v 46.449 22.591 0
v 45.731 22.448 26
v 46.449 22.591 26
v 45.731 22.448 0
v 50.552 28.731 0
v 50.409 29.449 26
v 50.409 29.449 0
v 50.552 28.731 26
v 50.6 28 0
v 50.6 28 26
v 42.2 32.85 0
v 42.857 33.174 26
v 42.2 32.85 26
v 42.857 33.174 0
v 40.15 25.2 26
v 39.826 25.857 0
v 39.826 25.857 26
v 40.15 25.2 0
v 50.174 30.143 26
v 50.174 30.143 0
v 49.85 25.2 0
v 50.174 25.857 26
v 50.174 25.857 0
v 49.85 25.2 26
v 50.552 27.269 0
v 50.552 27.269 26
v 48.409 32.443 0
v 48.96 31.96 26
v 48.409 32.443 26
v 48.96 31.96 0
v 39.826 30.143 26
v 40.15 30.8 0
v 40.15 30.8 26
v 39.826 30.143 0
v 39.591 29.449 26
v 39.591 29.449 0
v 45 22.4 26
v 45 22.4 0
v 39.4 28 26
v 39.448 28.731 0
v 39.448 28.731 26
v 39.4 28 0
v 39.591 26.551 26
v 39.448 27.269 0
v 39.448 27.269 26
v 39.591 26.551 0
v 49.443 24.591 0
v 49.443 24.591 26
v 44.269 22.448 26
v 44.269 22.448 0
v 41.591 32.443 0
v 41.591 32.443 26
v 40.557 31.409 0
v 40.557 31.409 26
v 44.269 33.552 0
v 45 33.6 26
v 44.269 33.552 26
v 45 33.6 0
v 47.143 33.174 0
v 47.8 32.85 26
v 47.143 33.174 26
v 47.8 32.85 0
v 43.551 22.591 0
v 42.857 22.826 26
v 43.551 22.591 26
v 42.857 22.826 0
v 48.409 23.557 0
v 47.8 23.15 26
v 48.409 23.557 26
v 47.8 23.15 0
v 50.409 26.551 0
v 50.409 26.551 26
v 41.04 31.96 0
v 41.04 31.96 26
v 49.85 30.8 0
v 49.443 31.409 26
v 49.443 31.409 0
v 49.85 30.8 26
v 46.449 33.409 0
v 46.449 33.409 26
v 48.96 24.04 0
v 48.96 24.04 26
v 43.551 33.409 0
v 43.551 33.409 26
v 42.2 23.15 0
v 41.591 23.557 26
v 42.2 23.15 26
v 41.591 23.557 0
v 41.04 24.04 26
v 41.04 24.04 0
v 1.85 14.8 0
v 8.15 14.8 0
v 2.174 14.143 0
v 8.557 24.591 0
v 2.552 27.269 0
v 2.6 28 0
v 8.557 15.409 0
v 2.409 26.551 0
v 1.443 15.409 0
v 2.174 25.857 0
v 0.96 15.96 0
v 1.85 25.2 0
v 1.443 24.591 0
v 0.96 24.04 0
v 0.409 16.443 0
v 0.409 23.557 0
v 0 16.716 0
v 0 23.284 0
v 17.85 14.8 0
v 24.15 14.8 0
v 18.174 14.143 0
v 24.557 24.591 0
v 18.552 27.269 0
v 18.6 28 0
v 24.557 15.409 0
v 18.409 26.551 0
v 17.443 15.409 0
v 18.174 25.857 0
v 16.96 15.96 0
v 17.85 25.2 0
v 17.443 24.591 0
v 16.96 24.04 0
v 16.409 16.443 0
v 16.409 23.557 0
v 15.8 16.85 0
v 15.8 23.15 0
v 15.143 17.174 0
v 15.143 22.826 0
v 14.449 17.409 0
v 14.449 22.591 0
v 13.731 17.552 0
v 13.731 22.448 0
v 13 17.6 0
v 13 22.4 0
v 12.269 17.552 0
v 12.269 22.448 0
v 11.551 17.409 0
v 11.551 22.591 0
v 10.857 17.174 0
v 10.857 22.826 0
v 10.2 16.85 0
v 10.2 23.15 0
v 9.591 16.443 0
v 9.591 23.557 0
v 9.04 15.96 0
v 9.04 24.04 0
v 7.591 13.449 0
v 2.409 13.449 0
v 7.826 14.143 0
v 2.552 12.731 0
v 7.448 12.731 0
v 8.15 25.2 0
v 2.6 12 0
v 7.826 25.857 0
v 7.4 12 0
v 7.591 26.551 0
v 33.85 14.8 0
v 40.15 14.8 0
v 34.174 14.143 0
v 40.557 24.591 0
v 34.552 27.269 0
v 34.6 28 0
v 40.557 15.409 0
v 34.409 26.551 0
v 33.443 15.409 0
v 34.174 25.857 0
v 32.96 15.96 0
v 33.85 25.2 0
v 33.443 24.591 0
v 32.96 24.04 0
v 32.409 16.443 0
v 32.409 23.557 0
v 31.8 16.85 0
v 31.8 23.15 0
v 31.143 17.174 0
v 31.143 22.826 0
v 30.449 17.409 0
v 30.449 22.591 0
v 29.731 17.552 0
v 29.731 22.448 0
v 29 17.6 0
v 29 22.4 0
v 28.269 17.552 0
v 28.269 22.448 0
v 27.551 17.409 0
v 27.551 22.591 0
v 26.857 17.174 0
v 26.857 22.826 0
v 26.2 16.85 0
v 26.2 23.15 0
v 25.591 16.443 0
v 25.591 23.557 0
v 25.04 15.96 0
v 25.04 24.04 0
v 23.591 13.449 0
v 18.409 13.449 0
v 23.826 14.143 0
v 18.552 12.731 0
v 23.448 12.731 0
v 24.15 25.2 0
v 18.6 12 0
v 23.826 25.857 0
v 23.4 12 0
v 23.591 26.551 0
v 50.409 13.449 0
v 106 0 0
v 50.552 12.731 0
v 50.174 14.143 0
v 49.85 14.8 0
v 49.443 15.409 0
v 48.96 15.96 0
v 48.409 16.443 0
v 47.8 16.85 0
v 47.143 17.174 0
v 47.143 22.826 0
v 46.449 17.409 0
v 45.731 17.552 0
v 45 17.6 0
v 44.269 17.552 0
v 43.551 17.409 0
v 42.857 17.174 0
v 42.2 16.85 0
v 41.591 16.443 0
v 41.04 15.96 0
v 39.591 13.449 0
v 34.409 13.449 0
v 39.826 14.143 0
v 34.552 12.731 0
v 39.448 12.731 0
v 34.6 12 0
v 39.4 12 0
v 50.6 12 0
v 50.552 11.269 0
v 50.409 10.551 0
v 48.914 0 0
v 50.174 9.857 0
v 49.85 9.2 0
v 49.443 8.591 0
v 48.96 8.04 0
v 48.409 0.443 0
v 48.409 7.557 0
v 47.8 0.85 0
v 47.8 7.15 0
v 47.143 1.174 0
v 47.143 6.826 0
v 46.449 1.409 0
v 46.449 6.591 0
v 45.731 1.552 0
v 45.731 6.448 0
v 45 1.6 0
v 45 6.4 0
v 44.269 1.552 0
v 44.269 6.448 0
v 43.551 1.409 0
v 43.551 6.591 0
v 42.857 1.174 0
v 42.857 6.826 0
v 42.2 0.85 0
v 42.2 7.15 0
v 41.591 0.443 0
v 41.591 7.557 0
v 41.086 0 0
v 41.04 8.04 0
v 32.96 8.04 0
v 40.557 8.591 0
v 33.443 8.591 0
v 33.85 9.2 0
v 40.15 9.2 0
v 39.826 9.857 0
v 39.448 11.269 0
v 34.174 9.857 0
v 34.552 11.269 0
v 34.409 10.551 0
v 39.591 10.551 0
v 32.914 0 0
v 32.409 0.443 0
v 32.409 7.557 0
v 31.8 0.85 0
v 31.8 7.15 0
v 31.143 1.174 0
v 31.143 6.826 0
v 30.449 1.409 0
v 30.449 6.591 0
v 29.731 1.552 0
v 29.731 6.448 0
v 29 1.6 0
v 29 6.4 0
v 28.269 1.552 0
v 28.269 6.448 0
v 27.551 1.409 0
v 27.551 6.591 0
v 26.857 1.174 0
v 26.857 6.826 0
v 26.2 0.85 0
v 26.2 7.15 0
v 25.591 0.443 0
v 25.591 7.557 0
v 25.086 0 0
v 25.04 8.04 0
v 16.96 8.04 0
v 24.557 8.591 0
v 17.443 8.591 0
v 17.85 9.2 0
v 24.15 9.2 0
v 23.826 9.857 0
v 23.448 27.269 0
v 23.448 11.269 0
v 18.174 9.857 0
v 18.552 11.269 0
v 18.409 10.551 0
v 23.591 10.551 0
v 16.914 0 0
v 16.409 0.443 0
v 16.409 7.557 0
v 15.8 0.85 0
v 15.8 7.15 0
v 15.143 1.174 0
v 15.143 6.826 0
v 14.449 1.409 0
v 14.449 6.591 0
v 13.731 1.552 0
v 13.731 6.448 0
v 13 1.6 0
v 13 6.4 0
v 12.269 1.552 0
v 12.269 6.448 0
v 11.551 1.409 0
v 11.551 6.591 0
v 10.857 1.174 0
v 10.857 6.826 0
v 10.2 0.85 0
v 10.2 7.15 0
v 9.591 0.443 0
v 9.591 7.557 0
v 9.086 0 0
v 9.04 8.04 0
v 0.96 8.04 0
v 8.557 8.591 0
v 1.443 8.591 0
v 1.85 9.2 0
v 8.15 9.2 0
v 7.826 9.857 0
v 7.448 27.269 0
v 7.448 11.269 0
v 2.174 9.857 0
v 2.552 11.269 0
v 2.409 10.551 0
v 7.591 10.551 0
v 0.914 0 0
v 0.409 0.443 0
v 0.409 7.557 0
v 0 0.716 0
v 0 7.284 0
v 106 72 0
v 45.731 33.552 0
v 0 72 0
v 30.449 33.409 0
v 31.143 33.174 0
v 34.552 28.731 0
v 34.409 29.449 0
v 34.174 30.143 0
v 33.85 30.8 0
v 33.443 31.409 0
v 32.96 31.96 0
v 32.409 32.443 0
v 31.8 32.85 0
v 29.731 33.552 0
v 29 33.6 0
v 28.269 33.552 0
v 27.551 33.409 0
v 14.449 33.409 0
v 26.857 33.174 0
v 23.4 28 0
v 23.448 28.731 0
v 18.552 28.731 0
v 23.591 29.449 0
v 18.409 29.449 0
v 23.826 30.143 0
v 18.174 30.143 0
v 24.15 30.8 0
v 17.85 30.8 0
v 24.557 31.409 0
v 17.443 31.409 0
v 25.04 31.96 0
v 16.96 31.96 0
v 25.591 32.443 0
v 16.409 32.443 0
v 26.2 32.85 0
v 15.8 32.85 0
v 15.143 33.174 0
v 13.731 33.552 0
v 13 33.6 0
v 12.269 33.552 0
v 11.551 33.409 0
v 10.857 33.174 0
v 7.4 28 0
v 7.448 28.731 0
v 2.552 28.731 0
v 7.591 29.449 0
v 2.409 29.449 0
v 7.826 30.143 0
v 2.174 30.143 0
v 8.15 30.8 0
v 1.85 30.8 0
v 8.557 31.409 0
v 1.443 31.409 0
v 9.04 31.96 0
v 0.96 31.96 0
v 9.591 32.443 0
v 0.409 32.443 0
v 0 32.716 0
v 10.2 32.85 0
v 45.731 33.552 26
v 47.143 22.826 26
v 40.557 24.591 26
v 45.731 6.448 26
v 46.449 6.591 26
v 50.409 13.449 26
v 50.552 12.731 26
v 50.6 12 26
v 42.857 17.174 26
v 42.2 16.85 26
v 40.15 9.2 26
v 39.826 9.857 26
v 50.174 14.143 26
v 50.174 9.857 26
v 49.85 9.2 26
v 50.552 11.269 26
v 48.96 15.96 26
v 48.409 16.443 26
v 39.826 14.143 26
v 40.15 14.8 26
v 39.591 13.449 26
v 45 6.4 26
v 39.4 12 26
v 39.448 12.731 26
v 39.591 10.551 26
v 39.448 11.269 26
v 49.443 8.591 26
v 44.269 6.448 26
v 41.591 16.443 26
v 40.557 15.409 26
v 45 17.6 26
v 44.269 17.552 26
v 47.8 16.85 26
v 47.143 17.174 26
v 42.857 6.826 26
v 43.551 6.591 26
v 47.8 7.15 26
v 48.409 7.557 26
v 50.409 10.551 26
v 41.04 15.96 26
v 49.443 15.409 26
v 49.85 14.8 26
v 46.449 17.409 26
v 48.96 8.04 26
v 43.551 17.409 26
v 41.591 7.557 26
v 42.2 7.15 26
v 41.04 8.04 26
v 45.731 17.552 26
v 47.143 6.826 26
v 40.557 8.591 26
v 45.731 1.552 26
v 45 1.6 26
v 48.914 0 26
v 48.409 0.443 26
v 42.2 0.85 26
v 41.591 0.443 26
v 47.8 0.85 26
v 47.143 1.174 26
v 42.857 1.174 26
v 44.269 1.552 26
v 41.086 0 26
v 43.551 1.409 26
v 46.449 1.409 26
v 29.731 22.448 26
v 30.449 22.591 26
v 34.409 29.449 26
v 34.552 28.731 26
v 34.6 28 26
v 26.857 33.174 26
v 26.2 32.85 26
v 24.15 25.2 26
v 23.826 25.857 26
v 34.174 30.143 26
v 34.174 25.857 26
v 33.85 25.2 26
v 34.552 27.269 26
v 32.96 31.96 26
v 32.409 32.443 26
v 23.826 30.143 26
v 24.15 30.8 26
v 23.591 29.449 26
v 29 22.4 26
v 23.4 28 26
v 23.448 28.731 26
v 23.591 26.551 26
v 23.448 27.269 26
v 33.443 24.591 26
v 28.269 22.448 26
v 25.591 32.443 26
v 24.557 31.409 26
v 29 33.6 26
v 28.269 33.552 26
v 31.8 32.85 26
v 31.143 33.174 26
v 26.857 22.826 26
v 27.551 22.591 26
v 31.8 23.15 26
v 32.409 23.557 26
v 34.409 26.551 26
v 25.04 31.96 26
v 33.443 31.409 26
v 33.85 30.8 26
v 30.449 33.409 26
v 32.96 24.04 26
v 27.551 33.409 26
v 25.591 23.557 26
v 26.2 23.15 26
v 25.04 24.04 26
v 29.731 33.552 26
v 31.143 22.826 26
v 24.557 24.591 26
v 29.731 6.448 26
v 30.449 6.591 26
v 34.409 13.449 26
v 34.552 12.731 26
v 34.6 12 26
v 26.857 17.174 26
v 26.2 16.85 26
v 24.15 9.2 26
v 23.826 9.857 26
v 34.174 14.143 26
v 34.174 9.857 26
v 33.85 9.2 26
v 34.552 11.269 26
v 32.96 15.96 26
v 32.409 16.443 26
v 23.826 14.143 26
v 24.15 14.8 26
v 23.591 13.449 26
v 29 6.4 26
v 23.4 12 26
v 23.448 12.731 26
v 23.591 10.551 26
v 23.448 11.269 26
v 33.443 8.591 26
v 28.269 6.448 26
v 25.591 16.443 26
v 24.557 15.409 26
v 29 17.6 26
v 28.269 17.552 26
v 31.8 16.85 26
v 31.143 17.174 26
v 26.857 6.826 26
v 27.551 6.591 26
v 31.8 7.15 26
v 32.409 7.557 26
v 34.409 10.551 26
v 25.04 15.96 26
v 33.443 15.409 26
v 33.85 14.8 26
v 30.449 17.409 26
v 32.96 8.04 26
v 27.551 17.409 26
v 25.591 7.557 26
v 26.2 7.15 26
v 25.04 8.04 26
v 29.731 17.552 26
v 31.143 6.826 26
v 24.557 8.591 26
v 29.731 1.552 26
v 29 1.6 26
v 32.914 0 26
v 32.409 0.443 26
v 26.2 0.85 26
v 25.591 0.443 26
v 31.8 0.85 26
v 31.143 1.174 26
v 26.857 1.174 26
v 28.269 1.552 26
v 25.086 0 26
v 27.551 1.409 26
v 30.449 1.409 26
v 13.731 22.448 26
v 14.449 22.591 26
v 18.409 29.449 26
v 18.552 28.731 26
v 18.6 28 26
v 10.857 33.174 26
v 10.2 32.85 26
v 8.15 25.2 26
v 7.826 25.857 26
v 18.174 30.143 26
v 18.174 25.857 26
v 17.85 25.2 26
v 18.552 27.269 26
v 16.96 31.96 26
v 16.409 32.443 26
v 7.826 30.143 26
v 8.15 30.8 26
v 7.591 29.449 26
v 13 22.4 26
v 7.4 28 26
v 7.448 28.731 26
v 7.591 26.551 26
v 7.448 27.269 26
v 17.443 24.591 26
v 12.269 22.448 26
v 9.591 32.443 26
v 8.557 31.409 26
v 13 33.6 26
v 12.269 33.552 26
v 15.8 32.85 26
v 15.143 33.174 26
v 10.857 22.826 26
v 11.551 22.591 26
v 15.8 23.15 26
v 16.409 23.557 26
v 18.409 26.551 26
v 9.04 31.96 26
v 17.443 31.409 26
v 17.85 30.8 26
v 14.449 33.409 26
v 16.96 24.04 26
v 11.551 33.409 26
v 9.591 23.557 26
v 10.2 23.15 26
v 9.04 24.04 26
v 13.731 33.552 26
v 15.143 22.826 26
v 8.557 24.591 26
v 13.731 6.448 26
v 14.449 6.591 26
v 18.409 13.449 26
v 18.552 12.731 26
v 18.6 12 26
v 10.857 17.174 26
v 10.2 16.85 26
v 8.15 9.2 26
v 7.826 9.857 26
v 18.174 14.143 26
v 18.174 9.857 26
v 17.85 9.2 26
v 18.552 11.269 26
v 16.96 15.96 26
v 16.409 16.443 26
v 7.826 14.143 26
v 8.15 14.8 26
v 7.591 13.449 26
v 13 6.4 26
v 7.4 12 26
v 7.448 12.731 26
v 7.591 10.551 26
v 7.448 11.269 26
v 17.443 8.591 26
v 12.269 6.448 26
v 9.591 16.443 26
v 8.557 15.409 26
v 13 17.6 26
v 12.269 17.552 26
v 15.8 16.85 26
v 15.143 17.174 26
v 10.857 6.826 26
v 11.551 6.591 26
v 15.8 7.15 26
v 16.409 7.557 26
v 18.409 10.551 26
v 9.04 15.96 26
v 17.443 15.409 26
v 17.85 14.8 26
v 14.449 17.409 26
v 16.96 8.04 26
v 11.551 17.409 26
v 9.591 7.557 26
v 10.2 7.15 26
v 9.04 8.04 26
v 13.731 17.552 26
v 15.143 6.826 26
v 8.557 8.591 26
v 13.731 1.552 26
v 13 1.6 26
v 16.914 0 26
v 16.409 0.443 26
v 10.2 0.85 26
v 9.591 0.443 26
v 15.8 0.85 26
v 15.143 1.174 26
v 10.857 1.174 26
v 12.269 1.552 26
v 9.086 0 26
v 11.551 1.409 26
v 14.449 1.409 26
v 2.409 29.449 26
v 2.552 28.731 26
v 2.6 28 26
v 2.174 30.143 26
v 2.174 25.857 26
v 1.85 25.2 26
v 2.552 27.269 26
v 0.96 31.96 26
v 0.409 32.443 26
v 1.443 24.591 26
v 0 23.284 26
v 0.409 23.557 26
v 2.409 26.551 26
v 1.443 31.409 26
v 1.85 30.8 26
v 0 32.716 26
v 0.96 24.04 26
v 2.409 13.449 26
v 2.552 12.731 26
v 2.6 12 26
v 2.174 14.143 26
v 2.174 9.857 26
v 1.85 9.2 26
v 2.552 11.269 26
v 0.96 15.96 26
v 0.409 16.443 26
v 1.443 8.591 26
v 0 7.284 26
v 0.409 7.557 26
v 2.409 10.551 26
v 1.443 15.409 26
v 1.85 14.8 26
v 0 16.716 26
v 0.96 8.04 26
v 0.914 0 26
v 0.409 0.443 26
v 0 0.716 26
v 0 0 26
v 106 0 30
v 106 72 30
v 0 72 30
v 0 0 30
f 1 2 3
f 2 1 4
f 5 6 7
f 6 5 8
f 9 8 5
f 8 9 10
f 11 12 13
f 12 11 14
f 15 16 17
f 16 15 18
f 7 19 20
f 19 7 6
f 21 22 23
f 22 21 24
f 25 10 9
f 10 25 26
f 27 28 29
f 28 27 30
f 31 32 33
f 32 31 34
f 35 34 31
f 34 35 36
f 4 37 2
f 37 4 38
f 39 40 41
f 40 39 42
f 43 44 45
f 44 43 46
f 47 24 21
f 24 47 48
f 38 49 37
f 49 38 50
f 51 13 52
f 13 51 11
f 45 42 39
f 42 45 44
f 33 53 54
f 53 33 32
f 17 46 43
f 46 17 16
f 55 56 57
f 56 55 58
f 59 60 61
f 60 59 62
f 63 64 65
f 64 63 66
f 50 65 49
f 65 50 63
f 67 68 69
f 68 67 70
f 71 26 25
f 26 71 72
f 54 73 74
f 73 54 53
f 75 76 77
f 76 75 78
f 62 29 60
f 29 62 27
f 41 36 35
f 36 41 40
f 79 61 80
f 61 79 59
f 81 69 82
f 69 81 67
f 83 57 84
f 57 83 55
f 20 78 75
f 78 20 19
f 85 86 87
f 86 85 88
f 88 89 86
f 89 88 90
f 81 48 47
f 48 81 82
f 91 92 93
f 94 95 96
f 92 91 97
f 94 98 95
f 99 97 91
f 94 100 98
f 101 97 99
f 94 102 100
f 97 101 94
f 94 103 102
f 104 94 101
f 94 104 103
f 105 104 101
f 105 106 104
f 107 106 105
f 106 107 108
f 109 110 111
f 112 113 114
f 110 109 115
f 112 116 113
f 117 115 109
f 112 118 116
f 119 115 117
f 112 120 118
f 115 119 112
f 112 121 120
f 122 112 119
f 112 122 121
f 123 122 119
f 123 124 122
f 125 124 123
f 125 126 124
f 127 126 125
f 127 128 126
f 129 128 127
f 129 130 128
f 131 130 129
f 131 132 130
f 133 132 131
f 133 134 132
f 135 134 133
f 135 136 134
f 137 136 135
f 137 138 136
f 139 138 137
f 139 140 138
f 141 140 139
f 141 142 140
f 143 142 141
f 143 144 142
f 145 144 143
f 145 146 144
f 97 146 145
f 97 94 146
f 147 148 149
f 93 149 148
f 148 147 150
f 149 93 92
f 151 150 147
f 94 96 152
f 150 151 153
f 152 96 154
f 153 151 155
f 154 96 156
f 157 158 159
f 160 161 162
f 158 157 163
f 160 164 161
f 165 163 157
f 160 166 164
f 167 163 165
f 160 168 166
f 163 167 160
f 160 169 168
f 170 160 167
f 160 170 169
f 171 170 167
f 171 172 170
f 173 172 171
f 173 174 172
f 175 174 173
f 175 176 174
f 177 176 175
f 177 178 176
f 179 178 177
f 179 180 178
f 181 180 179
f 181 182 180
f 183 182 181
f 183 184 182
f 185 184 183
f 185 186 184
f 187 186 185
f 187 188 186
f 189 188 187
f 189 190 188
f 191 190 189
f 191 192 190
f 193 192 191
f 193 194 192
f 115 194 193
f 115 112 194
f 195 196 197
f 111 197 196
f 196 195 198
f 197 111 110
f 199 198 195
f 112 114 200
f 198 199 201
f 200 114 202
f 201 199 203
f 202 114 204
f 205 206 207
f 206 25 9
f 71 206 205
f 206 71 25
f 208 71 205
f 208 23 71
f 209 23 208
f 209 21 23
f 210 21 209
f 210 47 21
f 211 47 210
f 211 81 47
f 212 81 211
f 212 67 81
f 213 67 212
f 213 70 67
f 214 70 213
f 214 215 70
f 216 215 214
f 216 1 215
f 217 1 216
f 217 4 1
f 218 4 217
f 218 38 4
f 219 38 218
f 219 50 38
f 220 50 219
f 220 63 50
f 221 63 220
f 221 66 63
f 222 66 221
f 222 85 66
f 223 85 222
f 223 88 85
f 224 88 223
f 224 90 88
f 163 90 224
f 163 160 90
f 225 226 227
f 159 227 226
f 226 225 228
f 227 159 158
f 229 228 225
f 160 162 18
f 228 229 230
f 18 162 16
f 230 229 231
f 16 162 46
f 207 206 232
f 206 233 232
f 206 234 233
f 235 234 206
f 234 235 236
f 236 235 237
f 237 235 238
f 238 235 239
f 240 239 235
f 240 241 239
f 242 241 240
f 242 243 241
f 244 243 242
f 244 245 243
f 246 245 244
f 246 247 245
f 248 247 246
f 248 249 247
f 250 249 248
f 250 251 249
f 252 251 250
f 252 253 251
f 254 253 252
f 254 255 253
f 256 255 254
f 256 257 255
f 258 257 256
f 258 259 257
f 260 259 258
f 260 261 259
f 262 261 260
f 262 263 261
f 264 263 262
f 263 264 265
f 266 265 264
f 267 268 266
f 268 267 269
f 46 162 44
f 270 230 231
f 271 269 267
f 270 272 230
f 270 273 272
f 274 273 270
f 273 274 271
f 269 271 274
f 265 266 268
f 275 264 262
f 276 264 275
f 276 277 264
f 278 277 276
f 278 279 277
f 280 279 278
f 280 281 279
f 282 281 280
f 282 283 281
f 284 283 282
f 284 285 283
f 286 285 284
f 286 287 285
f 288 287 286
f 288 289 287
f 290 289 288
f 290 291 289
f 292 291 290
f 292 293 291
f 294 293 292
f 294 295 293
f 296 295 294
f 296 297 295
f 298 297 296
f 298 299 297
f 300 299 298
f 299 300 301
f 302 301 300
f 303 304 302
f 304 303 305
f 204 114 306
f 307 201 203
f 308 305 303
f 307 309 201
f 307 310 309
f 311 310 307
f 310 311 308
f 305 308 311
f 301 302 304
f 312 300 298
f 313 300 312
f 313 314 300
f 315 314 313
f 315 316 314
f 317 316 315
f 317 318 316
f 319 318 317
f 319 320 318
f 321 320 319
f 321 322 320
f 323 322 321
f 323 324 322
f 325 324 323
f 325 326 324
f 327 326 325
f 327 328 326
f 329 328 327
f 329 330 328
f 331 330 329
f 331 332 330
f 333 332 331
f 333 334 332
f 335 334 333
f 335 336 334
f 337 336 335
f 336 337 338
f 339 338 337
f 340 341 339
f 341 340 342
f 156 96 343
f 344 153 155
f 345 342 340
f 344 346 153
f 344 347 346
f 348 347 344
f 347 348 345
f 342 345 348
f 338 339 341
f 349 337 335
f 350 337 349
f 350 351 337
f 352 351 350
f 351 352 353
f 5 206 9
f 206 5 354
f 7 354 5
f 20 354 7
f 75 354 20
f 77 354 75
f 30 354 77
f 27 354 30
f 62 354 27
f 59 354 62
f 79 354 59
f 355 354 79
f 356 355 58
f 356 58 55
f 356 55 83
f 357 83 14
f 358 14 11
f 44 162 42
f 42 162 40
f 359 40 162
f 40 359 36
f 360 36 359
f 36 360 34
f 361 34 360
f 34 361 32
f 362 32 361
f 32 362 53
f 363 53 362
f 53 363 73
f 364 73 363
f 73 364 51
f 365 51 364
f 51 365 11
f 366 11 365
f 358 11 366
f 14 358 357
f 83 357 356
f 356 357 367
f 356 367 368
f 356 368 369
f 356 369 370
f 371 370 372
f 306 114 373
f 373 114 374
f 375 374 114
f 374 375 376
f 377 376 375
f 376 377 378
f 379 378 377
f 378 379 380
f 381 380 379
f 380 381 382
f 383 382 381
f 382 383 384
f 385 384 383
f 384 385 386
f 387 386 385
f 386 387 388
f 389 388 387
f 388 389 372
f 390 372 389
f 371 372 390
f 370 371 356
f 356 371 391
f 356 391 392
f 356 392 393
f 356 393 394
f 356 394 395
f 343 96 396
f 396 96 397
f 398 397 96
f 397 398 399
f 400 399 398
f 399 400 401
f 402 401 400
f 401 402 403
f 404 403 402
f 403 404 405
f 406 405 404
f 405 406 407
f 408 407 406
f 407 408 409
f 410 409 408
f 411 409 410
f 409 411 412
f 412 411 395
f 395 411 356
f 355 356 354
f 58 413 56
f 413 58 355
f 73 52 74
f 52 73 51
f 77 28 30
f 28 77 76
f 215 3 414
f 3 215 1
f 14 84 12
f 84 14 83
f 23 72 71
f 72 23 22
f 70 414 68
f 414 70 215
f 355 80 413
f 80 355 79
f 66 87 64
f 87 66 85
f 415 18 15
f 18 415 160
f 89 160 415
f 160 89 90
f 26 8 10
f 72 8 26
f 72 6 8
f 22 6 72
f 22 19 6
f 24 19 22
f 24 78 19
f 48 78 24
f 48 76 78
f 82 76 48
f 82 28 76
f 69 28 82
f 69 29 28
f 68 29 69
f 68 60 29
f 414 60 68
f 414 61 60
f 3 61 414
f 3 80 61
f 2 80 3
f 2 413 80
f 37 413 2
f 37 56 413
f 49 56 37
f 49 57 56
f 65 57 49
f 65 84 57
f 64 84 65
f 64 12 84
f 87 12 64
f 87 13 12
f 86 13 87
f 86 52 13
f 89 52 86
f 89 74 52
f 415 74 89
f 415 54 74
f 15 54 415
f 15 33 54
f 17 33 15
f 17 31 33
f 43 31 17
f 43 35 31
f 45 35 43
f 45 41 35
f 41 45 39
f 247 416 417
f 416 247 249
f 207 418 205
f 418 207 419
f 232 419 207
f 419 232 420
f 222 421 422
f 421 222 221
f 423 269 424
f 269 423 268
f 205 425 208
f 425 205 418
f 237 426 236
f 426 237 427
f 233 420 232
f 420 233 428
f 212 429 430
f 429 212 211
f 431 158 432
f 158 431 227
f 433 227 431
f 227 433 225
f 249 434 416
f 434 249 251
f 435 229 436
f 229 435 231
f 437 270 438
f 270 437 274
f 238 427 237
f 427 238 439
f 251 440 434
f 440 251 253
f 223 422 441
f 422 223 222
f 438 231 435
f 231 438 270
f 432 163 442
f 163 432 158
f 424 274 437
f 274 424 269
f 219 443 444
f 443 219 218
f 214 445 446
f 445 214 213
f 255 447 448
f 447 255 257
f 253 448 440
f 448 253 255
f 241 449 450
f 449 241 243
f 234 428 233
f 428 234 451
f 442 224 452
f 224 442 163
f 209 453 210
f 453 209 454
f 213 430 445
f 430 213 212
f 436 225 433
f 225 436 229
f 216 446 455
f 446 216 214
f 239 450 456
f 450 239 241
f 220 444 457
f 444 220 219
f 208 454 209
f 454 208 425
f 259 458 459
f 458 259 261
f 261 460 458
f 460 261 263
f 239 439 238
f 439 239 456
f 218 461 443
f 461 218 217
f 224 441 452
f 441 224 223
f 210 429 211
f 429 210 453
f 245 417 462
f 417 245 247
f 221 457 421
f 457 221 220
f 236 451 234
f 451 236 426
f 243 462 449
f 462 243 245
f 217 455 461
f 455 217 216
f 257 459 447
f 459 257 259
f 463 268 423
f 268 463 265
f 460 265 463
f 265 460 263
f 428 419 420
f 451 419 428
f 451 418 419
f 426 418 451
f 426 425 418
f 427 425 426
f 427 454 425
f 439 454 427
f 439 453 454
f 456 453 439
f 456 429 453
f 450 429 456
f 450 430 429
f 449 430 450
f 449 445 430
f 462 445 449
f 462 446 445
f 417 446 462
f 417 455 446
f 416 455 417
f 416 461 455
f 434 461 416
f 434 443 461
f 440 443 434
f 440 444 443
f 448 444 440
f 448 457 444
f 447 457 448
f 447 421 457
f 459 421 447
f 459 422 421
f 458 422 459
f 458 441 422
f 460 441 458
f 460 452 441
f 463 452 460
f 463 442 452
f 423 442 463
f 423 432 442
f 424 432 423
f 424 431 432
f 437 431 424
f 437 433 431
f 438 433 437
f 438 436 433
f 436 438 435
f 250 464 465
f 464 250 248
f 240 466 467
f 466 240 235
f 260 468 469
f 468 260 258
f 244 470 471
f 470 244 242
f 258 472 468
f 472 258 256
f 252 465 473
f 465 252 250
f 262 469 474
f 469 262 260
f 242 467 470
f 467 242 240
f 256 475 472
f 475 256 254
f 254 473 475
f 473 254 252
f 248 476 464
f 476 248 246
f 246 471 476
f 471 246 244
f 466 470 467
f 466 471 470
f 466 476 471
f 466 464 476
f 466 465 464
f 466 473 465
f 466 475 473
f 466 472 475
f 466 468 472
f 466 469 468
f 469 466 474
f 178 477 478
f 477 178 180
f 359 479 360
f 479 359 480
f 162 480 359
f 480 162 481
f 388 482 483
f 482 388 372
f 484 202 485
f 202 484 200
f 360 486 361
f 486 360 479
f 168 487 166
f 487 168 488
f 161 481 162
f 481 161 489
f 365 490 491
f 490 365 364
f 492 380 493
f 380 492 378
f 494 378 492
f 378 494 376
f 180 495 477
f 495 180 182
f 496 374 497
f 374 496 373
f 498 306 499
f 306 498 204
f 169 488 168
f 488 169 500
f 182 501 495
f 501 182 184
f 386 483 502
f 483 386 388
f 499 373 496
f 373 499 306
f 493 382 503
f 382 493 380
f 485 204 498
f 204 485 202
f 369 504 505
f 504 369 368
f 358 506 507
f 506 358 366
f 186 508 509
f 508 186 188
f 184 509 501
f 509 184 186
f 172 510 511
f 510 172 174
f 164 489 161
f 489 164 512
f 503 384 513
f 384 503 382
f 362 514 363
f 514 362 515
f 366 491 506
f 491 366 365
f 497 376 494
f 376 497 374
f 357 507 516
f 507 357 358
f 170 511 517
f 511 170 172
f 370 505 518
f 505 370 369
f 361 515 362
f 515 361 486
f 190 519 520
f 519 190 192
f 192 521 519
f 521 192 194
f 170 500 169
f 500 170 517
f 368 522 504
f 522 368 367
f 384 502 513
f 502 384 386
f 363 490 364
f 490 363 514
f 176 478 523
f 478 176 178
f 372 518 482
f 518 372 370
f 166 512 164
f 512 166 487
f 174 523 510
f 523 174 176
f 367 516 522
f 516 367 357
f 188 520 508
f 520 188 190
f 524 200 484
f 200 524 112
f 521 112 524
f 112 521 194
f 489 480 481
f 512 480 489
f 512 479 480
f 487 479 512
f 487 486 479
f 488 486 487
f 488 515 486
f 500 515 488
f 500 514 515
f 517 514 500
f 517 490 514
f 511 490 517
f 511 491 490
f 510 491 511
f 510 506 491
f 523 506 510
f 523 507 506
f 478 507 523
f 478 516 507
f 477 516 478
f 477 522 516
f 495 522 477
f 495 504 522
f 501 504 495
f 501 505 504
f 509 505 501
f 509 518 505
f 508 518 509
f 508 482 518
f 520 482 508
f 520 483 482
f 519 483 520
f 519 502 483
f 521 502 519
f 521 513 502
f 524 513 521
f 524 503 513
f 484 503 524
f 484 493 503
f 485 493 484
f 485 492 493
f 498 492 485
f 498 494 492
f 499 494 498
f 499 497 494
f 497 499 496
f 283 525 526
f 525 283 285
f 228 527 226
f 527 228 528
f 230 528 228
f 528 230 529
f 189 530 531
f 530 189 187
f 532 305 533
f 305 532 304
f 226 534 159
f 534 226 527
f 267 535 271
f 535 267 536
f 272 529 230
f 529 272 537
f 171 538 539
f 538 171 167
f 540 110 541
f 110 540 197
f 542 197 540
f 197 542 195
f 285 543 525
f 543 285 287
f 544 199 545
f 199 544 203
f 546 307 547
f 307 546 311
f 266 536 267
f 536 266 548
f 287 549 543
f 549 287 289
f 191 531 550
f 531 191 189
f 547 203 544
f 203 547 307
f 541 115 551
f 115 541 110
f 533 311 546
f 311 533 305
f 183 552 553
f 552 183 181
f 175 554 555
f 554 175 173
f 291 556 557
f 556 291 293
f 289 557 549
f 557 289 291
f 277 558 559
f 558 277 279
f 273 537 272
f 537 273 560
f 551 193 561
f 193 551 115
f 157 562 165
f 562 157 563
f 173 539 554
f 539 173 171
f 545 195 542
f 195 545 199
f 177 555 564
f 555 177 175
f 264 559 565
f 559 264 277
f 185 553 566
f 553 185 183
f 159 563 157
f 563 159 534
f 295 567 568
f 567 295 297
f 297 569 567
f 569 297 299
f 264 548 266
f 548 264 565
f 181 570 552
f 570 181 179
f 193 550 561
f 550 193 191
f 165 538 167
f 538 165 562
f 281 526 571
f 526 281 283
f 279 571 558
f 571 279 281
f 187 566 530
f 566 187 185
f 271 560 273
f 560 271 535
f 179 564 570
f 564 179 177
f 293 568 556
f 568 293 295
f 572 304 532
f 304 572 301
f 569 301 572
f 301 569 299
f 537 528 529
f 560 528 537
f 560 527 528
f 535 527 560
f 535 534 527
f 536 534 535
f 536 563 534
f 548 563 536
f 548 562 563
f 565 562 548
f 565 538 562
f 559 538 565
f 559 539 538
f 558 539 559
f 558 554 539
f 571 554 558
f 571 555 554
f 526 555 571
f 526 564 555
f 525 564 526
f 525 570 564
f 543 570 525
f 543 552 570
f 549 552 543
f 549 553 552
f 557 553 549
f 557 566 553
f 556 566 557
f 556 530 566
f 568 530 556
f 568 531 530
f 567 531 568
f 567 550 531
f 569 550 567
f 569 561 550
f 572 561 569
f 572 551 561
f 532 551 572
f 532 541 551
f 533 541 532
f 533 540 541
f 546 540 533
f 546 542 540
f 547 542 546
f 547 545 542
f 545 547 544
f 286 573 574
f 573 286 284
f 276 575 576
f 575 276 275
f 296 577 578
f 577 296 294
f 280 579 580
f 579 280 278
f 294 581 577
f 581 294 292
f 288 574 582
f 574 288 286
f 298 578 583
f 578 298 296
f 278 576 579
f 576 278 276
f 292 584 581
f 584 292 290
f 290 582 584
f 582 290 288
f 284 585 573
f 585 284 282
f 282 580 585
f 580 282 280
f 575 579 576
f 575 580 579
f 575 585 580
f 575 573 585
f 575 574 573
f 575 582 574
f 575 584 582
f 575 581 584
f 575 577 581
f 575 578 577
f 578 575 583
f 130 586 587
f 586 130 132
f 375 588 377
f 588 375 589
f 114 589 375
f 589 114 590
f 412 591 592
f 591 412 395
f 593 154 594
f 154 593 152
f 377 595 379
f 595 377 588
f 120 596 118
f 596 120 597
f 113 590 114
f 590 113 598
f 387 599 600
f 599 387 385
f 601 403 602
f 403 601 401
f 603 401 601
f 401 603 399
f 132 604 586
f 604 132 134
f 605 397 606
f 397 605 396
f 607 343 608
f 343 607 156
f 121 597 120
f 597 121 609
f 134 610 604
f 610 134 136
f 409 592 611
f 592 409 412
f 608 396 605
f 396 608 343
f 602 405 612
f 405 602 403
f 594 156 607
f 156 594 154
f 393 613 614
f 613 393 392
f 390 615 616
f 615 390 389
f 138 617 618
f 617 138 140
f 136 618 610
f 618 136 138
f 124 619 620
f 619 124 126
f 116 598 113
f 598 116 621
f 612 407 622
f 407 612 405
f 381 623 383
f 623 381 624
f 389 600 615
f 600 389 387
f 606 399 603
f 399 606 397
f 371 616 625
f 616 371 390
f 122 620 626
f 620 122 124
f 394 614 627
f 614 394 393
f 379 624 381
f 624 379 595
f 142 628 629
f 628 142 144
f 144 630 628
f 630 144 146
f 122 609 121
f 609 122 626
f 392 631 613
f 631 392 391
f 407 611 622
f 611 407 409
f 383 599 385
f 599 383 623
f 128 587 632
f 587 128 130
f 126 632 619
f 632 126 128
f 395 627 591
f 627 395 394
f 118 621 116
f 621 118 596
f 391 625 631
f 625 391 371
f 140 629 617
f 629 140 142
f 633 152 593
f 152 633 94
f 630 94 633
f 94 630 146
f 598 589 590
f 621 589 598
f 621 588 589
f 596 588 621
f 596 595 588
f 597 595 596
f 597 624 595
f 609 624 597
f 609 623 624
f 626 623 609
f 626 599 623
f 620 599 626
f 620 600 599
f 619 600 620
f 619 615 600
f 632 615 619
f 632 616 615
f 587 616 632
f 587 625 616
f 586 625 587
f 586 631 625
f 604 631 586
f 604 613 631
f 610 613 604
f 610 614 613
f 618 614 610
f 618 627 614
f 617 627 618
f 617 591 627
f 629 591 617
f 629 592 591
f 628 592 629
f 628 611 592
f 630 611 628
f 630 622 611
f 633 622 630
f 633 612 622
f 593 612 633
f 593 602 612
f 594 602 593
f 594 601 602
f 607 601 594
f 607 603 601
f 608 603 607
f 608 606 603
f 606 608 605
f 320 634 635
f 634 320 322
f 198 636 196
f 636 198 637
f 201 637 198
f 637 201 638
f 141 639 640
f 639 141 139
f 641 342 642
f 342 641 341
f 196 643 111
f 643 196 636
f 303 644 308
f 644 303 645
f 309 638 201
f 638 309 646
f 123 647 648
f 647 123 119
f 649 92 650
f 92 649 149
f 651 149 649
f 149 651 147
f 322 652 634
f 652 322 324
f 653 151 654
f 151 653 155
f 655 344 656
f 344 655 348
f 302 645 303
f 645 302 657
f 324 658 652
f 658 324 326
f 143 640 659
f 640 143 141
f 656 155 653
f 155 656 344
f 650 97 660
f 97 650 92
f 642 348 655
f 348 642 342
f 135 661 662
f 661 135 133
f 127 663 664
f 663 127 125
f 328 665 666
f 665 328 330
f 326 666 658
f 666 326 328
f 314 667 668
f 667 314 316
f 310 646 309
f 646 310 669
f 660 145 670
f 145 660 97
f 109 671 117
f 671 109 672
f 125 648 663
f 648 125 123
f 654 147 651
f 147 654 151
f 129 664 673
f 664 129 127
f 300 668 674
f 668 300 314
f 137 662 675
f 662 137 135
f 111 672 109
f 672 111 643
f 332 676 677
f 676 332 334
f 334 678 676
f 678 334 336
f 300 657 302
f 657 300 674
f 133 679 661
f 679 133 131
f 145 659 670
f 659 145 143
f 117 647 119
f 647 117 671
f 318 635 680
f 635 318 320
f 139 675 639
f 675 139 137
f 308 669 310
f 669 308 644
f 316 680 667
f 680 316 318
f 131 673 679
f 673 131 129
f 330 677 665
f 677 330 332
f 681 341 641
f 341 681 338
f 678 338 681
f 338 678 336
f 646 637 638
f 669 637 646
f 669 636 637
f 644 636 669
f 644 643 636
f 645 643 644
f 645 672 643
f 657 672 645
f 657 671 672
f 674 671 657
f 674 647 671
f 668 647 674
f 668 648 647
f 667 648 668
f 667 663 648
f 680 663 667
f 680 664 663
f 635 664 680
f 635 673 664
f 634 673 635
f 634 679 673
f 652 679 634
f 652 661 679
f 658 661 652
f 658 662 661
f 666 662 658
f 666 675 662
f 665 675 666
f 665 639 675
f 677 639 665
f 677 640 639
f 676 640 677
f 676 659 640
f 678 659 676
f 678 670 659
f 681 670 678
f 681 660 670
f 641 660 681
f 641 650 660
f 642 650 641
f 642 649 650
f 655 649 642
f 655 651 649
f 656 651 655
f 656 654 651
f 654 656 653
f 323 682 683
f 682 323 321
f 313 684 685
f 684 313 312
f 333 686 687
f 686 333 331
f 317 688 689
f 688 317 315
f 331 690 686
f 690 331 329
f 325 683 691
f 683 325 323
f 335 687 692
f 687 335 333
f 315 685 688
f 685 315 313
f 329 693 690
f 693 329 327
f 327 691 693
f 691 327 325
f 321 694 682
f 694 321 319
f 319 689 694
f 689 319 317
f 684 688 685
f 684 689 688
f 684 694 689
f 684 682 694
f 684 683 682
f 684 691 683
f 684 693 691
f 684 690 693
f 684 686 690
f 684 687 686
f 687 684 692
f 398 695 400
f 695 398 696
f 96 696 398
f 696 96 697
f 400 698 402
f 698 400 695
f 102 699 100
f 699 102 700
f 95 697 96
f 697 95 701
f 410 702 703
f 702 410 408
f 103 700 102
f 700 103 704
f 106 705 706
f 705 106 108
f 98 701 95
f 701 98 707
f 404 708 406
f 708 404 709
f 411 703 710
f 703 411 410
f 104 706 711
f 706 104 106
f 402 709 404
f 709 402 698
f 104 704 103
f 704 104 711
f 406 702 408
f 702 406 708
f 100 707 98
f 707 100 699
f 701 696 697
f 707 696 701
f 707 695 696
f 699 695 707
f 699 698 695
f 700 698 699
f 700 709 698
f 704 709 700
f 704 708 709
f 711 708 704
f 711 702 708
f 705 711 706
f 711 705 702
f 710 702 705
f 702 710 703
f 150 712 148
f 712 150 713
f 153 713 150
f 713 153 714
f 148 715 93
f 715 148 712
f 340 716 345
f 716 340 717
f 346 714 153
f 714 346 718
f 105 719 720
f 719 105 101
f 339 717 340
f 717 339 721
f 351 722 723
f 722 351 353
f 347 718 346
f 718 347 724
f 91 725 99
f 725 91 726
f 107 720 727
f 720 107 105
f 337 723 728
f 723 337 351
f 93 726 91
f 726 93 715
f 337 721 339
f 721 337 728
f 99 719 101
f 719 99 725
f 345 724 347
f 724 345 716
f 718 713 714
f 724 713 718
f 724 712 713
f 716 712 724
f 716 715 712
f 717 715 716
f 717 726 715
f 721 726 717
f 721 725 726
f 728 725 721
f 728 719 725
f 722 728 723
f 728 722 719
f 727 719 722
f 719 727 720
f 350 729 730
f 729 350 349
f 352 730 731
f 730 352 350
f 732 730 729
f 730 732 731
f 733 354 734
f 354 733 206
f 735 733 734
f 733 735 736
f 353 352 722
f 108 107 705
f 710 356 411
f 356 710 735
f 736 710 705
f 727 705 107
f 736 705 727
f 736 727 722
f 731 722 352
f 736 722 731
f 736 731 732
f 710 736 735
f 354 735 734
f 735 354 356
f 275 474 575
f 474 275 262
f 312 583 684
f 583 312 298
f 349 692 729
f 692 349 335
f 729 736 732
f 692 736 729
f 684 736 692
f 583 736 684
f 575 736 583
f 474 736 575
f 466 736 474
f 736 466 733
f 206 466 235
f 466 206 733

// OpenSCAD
// Bench rack for 1.5 mL microcentrifuge tubes - a solid rectangular block with a regular
// grid of vertical tube holes, open at the top and closed at the bottom (a "floor" below
// the lowest hole). NOVEL general part, parametric in its grid and hole size.
//

L   = 106;
W   = 72;
H   = 30;
rows = 4;
cols = 6;
pX   = 16;
pY   = 16;
d    = 11.2;
depth = 25;

$fn = 48;

floor_t = 5;
hole_d  = d;
hole_h  = depth;

difference() {
    cube([L, W, H]);
    for (i = [0 : cols - 1], j = [0 : rows - 1])
        translate([L / 2 - pX * (i + 0.5), W / 2 - pY * (j + 0.5), 0])
            cylinder(h = depth + 1, d = hole_d);
}
